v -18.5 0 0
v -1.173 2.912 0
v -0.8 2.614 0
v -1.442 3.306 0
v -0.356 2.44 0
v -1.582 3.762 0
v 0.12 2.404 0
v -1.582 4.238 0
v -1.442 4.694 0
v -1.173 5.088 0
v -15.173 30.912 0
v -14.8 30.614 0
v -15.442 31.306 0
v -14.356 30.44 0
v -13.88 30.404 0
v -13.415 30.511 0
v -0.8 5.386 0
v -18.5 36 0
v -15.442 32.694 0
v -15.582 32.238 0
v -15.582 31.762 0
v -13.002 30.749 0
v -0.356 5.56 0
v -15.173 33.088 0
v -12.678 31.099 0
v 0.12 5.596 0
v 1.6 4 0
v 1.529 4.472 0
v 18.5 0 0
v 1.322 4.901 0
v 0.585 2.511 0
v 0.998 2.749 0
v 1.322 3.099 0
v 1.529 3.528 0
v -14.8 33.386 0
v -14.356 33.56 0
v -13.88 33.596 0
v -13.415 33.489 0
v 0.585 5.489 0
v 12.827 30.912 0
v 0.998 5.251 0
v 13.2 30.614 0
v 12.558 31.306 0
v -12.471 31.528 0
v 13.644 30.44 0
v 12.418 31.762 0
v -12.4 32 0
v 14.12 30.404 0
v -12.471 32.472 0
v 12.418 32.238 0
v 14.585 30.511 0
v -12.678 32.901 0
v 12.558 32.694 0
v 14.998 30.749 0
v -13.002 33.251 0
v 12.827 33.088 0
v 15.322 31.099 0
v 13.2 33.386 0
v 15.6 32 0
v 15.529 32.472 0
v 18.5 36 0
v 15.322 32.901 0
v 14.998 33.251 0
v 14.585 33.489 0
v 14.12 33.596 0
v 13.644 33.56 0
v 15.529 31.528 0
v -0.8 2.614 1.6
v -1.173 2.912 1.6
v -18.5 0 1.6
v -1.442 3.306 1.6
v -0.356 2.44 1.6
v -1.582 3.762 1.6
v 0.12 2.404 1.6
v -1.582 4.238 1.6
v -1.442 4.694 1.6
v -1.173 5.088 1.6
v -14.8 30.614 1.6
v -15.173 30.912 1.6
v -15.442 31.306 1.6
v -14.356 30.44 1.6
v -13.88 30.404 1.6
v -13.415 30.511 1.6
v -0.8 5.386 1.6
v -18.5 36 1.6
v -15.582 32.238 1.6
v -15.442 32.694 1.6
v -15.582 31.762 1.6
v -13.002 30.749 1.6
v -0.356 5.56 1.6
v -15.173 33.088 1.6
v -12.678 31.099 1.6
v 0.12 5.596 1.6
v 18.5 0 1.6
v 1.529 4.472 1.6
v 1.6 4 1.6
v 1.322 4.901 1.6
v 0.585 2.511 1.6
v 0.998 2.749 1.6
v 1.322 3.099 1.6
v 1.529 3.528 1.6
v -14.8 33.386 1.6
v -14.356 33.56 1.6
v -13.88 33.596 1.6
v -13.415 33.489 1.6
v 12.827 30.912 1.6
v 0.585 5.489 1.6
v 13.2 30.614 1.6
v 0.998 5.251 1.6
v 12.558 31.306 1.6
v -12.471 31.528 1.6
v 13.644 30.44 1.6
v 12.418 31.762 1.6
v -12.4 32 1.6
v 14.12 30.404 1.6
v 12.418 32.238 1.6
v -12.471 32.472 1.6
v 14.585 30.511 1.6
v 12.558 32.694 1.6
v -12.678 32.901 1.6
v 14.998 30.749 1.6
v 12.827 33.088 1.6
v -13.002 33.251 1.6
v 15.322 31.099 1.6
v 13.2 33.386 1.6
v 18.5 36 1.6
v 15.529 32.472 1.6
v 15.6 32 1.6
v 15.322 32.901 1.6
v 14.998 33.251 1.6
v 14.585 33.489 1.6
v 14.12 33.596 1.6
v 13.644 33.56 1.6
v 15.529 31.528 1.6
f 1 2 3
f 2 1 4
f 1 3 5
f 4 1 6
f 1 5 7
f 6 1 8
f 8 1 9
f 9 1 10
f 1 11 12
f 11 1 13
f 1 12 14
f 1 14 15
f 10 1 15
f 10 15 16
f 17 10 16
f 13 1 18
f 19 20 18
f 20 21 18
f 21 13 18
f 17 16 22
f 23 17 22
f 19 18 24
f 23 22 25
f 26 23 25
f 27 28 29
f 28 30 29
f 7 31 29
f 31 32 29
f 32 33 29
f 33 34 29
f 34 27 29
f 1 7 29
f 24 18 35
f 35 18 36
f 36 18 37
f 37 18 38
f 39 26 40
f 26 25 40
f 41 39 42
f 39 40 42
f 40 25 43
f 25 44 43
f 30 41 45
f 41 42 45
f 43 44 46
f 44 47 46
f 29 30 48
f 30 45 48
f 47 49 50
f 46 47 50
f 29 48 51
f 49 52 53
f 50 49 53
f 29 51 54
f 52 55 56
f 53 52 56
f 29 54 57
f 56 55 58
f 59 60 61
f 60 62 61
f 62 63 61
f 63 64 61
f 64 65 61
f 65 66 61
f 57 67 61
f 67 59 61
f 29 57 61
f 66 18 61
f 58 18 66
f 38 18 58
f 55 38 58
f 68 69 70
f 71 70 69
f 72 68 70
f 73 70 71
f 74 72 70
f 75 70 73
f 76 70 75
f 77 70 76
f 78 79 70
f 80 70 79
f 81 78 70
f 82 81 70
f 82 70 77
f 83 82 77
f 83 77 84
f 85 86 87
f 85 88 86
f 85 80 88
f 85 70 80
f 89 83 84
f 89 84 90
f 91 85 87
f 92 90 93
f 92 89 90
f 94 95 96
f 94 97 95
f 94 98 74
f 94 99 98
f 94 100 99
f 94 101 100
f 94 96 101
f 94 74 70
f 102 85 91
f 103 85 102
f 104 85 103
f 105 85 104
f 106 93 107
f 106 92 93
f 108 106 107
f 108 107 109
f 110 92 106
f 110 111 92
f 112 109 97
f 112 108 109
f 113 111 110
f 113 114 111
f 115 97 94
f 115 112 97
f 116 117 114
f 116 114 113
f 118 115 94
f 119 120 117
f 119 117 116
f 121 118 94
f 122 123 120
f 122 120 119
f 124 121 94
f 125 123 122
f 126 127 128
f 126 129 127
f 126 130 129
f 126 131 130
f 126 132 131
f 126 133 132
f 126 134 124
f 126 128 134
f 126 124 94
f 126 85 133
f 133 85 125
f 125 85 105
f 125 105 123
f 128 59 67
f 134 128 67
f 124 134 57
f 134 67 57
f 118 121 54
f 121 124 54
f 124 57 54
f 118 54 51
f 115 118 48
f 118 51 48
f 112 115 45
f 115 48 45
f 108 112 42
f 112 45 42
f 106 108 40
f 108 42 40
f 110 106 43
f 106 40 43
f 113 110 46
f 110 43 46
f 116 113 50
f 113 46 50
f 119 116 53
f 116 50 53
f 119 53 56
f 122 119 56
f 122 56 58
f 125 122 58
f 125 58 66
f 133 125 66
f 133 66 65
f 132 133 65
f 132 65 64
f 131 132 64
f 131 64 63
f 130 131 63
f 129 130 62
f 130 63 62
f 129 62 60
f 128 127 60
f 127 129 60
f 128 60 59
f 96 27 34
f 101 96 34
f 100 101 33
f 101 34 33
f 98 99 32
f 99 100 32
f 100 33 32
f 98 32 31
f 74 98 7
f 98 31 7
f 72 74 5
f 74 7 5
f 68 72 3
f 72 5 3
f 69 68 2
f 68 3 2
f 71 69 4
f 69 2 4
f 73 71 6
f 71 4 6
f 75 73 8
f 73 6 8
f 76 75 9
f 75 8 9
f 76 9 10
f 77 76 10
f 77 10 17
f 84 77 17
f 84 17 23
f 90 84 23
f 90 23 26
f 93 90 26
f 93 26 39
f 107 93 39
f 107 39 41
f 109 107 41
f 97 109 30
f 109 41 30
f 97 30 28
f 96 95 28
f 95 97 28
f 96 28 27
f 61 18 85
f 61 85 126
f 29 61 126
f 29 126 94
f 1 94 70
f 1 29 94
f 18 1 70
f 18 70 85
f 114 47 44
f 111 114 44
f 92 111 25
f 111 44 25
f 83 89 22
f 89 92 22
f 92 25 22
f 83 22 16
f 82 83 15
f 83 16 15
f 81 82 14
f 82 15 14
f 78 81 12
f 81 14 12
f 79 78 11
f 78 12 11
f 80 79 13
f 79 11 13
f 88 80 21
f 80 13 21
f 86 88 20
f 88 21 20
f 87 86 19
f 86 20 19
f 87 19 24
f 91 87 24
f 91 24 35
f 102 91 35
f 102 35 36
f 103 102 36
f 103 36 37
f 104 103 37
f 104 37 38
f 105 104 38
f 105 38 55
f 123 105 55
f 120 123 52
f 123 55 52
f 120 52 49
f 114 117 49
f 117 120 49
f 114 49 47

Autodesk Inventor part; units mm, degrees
ref_plane "YZ Plane" through (0, 0, 0) normal (1, 0, 0) x (0, 1, 0)
ref_plane "XZ Plane" through (0, 0, 0) normal (0, 1, 0) x (-1, 0, 0)
ref_plane "XY Plane" through (0, 0, 0) normal (0, 0, 1) x (1, 0, 0)
sketch "スケッチ1" plane through (0, 0, 0) normal (0, 0, 1) x (1, 0, 0)
  line L0 (-18.5, 36) -> (18.5, 36)
  line L1 (18.5, 36) -> (18.5, 0)
  line L2 (18.5, 0) -> (-18.5, 0)
  line L3 (-18.5, 0) -> (-18.5, 36)
  circle A0 centre (0, 4) radius 1.6
  circle A1 centre (14, 32) radius 1.6
  circle A2 centre (-14, 32) radius 1.6
  line L4 (0, 42.25) -> (0, -4.7356) construction
  point P0 (0, 0)
  point P1 (0, 0)
  dimension "d0" = 37
  dimension "d1" = 36
  dimension "d2" = 3.2
  dimension "d3" = 4
  dimension "d4" = 4
  dimension "d5" = 4.5
extrude "押し出し1" add sketch "スケッチ1" along normal blind 1.6
properties part number "PCB-EncoderMain"
